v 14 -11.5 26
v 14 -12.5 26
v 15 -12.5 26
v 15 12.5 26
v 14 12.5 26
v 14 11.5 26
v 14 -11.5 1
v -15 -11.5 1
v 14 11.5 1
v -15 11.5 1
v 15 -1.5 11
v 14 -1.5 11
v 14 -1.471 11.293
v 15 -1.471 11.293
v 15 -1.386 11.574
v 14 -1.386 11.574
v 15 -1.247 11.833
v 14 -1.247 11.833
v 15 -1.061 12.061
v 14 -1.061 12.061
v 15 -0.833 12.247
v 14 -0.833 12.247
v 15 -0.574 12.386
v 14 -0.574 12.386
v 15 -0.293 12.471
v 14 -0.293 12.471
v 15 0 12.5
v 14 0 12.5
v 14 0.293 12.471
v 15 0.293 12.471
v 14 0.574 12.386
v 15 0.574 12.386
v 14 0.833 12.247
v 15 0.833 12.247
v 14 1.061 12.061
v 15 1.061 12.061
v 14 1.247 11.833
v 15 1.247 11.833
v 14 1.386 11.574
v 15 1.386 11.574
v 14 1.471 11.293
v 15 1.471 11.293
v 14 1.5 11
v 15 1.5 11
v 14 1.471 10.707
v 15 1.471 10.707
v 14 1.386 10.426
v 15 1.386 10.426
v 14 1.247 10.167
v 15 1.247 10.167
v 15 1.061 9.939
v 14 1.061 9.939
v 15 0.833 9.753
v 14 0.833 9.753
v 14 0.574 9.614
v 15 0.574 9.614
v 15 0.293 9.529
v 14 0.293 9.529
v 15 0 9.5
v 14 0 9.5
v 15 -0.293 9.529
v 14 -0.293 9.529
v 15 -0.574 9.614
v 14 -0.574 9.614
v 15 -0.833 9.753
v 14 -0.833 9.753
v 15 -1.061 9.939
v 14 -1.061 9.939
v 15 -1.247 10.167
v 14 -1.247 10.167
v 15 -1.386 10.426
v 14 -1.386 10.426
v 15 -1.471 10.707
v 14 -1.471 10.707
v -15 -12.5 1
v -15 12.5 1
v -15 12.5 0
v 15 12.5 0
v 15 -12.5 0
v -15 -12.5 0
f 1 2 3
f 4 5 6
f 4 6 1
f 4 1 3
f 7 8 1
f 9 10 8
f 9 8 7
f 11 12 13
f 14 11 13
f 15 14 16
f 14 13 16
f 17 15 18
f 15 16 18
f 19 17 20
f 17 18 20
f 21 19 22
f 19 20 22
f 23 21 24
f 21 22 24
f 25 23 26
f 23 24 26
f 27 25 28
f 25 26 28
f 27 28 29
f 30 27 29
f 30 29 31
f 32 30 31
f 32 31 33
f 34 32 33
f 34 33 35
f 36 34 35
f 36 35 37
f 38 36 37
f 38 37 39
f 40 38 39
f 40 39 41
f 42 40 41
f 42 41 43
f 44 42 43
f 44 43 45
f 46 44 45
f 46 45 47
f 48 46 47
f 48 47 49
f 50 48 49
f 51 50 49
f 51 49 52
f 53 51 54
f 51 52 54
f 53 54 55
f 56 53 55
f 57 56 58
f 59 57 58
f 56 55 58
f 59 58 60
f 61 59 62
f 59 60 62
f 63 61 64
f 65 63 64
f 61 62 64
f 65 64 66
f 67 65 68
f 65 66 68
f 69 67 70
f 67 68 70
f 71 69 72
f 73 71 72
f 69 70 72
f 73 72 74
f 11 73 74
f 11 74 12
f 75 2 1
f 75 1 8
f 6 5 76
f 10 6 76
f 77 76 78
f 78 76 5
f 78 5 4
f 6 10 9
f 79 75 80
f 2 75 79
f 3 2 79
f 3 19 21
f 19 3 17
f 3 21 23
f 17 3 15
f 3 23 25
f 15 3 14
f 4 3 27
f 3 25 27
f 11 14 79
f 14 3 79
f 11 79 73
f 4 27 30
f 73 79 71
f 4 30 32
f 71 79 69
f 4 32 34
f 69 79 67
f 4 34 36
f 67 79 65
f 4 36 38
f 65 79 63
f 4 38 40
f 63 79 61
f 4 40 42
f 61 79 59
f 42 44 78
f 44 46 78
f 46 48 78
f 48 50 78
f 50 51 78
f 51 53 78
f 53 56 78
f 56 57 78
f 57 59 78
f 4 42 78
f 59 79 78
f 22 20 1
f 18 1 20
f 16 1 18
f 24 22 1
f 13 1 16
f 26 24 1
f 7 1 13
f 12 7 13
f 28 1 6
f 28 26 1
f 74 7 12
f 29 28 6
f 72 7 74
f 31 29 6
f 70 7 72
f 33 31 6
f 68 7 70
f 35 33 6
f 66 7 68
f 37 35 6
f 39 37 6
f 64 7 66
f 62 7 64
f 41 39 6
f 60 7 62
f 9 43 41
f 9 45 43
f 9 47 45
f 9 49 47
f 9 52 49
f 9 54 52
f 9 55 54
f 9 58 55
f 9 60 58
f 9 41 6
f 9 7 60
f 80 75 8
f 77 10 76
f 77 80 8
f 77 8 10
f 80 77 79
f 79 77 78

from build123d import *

# Parameters (mm, degrees)
SKETCH1_W           = 30
SKETCH1_H           = 25
BOSS_EXTRUDE1_DEPTH = 1
SKETCH2_W           = 1
SKETCH2_H           = 25
BOSS_EXTRUDE2_DEPTH = 25
BOSS_EXTRUDE3_DEPTH = 1
SKETCH7_R           = 1.5
CUT_EXTRUDE1_DEPTH  = 3


with BuildPart() as part:
    # Sketch1 → Boss-Extrude1 (new body)
    with BuildSketch(Plane.XY):
        Rectangle(SKETCH1_W, SKETCH1_H)
    extrude(amount=BOSS_EXTRUDE1_DEPTH)

    # Sketch2 → Boss-Extrude2 (add)
    with BuildSketch(Plane.XY.offset(1)):
        with Locations((14.5, 0)):
            Rectangle(SKETCH2_W, SKETCH2_H)
    extrude(amount=BOSS_EXTRUDE2_DEPTH)

    # Sketch6 → Boss-Extrude3 (add)
    with BuildSketch(Plane.XZ.offset(12.5)):
        Polygon((14, 26), (-15, 1), (14, 1), align=None)
    boss_extrude3 = extrude(amount=-BOSS_EXTRUDE3_DEPTH)

    # Mirror2: Boss-Extrude3 across plane
    add(boss_extrude3.mirror(Plane.ZX))

    # Sketch7 → Cut-Extrude1 (cut)
    with BuildSketch(Plane.ZY.offset(-14)):
        with Locations(Location((11, 0, 0), (0, 0, 270))):
            Circle(SKETCH7_R)
    extrude(amount=-CUT_EXTRUDE1_DEPTH, mode=Mode.SUBTRACT)


solid = part.part
